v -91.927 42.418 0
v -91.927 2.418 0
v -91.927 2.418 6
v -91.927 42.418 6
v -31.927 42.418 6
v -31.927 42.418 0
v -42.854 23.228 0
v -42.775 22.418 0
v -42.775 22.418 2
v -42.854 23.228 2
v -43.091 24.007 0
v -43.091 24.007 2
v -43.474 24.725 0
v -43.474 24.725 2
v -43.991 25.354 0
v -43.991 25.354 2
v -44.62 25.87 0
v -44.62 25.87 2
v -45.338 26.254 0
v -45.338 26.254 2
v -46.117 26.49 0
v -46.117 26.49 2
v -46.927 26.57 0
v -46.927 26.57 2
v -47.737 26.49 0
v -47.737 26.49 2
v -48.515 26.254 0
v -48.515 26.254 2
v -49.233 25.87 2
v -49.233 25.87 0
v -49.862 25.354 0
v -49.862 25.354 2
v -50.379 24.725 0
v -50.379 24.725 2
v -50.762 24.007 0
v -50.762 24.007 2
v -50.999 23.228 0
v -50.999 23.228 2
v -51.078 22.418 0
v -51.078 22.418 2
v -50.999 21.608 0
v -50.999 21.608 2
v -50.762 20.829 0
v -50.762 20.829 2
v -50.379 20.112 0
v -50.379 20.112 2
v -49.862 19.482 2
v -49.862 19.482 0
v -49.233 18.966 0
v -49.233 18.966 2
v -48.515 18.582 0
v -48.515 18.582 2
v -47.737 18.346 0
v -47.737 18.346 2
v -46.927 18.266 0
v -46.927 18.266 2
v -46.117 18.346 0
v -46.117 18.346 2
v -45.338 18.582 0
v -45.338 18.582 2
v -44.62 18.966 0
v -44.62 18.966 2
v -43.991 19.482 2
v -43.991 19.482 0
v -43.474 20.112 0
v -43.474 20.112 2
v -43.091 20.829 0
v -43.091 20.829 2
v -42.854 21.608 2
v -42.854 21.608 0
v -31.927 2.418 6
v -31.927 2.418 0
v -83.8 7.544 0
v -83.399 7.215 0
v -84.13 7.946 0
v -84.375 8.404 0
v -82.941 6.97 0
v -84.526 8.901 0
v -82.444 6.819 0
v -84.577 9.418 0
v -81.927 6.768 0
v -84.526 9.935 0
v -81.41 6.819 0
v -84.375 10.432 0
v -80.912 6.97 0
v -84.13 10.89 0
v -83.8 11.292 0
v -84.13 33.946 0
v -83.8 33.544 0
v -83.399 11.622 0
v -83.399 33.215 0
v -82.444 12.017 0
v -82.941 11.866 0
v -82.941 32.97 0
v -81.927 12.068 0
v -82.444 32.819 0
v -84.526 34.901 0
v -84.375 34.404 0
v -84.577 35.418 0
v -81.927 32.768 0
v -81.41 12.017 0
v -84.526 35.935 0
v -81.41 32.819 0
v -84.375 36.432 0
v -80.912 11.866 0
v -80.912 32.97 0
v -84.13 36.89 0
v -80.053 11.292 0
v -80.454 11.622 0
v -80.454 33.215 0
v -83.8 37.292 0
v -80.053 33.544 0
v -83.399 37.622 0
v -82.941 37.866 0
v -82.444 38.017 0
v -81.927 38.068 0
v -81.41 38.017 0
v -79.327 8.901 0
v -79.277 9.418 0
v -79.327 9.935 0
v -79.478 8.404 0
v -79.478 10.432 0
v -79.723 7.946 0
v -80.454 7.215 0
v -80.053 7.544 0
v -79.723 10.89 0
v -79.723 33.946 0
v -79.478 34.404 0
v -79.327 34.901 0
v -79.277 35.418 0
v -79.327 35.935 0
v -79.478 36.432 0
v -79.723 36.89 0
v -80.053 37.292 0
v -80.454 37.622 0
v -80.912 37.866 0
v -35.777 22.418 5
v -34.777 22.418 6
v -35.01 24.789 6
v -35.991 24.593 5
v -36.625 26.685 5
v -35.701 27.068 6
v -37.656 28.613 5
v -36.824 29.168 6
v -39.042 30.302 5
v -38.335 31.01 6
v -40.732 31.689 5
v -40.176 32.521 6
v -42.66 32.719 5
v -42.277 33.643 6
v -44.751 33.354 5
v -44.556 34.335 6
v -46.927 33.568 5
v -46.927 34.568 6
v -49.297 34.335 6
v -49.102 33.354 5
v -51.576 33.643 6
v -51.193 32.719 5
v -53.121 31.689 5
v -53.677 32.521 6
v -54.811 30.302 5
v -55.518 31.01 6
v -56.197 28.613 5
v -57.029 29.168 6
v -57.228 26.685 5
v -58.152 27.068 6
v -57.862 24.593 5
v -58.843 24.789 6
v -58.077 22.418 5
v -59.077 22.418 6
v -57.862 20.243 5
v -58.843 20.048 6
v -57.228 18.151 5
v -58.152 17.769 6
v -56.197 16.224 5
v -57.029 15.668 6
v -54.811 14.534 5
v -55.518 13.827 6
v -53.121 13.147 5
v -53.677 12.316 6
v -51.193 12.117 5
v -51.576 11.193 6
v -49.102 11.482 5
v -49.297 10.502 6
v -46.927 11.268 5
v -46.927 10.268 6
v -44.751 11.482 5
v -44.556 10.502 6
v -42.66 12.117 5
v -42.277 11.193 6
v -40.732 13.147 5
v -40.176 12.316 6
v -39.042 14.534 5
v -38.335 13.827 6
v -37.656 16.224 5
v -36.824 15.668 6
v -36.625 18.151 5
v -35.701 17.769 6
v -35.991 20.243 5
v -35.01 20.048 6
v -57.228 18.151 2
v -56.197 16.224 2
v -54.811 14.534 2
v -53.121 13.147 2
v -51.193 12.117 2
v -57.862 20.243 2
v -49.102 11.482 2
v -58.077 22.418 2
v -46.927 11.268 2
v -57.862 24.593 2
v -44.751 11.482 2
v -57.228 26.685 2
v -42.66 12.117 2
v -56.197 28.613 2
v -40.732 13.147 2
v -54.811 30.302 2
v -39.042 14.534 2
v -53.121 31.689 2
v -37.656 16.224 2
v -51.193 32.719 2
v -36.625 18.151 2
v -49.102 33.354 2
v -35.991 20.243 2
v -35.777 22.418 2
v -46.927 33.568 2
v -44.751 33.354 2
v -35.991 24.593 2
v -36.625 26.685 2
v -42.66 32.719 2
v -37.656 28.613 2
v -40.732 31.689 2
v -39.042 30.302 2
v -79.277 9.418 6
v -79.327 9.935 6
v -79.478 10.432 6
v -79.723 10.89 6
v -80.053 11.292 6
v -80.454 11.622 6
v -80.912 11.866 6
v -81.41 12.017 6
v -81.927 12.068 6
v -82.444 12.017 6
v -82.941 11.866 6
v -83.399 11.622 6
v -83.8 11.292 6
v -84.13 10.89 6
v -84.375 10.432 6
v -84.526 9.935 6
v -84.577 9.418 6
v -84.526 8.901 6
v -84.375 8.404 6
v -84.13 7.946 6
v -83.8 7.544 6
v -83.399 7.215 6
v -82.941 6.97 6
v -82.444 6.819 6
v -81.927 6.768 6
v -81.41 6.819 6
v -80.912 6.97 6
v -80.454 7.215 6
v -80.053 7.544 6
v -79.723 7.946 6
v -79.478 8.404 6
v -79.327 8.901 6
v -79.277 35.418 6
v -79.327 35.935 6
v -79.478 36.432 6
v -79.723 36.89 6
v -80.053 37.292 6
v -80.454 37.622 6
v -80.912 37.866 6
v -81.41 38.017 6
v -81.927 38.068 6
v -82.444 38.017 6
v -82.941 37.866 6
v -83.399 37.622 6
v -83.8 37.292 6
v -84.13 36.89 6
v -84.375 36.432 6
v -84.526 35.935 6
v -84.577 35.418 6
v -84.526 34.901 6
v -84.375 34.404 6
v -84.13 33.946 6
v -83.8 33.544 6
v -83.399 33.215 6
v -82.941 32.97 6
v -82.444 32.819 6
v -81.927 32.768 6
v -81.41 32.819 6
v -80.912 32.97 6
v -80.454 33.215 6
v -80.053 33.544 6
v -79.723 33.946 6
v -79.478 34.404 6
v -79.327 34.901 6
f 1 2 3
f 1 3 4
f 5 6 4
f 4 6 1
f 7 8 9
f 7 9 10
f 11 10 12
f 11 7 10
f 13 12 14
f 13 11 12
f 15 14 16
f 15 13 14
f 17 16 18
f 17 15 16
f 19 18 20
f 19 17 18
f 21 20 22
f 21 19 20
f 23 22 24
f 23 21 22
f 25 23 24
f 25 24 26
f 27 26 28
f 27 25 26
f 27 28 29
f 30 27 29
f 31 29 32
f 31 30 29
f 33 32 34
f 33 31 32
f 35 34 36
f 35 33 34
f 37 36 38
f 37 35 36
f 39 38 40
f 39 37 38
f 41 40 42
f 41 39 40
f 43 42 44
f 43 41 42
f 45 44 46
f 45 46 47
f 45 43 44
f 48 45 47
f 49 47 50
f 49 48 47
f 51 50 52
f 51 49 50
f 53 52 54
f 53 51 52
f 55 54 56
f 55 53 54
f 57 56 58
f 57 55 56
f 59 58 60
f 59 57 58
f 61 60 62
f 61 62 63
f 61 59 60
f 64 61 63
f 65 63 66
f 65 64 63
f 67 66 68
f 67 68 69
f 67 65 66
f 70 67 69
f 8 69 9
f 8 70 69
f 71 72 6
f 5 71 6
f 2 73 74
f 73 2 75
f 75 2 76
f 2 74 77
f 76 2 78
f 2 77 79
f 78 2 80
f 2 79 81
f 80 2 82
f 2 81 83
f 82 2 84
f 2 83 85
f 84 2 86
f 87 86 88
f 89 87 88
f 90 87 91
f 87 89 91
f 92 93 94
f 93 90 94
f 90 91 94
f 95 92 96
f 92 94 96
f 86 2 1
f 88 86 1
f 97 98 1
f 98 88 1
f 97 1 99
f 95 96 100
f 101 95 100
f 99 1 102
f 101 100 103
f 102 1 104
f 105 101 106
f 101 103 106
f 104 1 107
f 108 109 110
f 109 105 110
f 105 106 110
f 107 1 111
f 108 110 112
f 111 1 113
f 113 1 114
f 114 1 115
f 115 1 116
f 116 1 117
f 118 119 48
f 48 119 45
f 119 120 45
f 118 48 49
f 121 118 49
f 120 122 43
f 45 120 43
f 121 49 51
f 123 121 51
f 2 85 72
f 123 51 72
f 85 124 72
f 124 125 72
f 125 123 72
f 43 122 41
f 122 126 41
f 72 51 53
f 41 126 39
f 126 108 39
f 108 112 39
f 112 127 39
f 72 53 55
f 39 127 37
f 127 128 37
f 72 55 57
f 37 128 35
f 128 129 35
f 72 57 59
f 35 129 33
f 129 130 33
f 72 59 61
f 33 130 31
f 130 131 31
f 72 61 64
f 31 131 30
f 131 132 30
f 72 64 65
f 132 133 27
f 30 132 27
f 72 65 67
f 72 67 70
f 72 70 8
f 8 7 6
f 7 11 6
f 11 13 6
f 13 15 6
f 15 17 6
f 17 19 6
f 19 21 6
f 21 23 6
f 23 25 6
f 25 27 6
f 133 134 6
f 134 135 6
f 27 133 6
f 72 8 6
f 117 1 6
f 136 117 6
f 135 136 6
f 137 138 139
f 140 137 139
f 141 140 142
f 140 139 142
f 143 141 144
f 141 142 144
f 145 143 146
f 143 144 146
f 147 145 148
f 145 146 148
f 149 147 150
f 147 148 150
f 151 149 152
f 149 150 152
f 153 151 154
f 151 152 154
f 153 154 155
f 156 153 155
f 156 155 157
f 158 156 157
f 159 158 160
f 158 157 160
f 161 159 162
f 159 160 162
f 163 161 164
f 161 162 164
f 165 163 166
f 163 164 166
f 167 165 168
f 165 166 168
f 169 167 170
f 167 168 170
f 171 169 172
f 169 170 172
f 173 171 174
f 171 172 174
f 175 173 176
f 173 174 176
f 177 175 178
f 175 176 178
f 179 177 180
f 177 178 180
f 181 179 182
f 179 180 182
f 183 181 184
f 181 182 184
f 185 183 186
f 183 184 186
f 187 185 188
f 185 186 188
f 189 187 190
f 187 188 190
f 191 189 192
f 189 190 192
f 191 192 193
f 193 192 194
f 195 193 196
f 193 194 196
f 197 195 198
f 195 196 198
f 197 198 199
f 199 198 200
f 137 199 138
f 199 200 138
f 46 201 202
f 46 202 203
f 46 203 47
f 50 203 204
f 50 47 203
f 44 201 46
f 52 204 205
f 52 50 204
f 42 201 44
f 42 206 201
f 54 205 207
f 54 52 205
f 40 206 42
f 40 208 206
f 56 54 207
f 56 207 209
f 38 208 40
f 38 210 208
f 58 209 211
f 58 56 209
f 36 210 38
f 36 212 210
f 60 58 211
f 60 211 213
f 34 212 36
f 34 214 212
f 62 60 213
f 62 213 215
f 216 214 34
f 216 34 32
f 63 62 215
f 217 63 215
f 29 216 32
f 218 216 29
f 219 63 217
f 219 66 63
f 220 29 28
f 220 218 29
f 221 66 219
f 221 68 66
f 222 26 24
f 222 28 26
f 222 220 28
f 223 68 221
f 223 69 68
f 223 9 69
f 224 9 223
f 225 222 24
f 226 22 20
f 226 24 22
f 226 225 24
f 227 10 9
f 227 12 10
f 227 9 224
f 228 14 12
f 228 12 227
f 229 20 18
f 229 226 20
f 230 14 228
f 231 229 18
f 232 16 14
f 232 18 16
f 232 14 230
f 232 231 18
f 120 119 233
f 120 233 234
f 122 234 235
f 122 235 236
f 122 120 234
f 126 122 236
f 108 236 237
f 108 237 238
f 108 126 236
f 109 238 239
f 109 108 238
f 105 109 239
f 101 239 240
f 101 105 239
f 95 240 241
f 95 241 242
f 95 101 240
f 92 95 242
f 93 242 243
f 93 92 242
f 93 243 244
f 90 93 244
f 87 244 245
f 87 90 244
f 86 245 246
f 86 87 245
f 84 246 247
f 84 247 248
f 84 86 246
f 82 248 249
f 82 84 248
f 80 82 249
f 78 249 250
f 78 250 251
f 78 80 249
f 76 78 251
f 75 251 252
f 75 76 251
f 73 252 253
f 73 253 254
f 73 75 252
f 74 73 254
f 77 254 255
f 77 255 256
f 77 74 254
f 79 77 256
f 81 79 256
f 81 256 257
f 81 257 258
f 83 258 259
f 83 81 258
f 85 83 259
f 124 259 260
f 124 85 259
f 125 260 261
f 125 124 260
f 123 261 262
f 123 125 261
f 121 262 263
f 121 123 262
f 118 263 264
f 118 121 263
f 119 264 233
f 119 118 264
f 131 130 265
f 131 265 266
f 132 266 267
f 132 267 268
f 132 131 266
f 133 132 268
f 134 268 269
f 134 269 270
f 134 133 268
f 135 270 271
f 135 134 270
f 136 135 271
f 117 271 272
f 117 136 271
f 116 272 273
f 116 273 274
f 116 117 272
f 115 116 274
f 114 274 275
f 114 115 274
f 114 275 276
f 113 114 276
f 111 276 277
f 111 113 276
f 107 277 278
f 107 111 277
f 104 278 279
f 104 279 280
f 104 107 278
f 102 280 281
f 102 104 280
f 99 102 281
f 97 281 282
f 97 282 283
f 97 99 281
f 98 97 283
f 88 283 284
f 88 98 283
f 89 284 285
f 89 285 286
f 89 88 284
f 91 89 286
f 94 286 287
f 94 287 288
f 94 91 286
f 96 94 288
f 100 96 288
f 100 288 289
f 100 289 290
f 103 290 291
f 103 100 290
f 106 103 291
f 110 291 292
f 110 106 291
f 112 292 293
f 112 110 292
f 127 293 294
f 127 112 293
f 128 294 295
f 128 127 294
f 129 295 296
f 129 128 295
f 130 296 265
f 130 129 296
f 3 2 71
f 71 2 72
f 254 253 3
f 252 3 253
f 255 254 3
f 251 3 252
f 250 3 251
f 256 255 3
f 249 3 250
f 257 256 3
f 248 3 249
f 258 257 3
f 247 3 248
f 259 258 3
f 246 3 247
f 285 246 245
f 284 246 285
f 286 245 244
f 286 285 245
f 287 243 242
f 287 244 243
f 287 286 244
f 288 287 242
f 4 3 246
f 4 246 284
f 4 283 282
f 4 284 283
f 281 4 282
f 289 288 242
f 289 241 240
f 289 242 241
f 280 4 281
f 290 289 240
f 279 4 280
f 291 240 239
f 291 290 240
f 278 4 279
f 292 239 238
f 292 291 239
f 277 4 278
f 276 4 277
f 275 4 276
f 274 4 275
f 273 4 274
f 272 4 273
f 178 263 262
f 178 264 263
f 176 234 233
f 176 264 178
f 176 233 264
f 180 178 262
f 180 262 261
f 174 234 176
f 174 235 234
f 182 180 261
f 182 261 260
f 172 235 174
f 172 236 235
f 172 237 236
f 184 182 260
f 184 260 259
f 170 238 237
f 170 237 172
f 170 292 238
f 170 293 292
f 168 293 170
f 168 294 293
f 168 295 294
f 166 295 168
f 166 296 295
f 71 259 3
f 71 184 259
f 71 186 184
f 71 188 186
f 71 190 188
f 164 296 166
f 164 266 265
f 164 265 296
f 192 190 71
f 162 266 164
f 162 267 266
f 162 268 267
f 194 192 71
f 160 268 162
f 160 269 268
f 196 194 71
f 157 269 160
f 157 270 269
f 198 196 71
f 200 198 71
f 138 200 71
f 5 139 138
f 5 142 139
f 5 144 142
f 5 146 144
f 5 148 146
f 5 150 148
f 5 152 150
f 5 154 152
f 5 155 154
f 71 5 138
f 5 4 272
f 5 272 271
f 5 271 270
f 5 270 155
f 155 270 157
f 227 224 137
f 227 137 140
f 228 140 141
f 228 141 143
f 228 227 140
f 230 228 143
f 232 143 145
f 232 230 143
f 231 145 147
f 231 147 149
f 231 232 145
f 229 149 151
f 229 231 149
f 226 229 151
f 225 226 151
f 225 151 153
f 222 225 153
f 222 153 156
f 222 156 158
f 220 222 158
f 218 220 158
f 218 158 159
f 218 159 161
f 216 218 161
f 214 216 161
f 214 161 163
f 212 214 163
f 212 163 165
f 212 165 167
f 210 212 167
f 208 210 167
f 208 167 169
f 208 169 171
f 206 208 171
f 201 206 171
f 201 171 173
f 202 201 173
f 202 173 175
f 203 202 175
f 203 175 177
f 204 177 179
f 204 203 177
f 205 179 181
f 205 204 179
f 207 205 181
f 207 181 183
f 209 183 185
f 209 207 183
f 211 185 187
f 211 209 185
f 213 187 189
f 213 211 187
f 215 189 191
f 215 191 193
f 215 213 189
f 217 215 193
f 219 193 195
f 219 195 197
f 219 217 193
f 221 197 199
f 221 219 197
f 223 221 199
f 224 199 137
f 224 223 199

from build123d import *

# Parameters (mm, degrees)
F0_W     = 40
F0_H     = 40
F0_R     = 11.15
F0_W_2   = 20
F0_R_2   = 2.65
F1_DEPTH = 6
F0_R_3   = 4.151826
F2_DEPTH = 2
F3_SIZE  = 1


with BuildPart() as f1:
    # F0 (on Top) → F1 (new body)
    with BuildSketch(Plane.XY):
        with Locations((-51.926523, 22.418201)):
            Rectangle(F0_W, F0_H)
        with Locations((-46.926523, 22.418201)):
            Circle(F0_R, mode=Mode.SUBTRACT)
        with Locations((-81.926523, 22.418201)):
            Rectangle(F0_W_2, F0_H)
        with Locations((-81.926523, 9.418201)):
            Circle(F0_R_2, mode=Mode.SUBTRACT)
        with Locations((-81.926523, 35.418201)):
            Circle(F0_R_2, mode=Mode.SUBTRACT)
    extrude(amount=F1_DEPTH)

    # F0 (on Top) → F2 (join)
    with BuildSketch(Plane.XY):
        with Locations((-46.926523, 22.418201)):
            Circle(F0_R)
        with Locations((-46.926523, 22.418201)):
            Circle(F0_R_3, mode=Mode.SUBTRACT)
    extrude(amount=F2_DEPTH)

    # F3
    f3_edges = [f1.edges().sort_by_distance(p)[0] for p in [
        (-58.076523, 22.418201, 6),
    ]]
    chamfer(f3_edges, length=F3_SIZE)


solid = f1.part
